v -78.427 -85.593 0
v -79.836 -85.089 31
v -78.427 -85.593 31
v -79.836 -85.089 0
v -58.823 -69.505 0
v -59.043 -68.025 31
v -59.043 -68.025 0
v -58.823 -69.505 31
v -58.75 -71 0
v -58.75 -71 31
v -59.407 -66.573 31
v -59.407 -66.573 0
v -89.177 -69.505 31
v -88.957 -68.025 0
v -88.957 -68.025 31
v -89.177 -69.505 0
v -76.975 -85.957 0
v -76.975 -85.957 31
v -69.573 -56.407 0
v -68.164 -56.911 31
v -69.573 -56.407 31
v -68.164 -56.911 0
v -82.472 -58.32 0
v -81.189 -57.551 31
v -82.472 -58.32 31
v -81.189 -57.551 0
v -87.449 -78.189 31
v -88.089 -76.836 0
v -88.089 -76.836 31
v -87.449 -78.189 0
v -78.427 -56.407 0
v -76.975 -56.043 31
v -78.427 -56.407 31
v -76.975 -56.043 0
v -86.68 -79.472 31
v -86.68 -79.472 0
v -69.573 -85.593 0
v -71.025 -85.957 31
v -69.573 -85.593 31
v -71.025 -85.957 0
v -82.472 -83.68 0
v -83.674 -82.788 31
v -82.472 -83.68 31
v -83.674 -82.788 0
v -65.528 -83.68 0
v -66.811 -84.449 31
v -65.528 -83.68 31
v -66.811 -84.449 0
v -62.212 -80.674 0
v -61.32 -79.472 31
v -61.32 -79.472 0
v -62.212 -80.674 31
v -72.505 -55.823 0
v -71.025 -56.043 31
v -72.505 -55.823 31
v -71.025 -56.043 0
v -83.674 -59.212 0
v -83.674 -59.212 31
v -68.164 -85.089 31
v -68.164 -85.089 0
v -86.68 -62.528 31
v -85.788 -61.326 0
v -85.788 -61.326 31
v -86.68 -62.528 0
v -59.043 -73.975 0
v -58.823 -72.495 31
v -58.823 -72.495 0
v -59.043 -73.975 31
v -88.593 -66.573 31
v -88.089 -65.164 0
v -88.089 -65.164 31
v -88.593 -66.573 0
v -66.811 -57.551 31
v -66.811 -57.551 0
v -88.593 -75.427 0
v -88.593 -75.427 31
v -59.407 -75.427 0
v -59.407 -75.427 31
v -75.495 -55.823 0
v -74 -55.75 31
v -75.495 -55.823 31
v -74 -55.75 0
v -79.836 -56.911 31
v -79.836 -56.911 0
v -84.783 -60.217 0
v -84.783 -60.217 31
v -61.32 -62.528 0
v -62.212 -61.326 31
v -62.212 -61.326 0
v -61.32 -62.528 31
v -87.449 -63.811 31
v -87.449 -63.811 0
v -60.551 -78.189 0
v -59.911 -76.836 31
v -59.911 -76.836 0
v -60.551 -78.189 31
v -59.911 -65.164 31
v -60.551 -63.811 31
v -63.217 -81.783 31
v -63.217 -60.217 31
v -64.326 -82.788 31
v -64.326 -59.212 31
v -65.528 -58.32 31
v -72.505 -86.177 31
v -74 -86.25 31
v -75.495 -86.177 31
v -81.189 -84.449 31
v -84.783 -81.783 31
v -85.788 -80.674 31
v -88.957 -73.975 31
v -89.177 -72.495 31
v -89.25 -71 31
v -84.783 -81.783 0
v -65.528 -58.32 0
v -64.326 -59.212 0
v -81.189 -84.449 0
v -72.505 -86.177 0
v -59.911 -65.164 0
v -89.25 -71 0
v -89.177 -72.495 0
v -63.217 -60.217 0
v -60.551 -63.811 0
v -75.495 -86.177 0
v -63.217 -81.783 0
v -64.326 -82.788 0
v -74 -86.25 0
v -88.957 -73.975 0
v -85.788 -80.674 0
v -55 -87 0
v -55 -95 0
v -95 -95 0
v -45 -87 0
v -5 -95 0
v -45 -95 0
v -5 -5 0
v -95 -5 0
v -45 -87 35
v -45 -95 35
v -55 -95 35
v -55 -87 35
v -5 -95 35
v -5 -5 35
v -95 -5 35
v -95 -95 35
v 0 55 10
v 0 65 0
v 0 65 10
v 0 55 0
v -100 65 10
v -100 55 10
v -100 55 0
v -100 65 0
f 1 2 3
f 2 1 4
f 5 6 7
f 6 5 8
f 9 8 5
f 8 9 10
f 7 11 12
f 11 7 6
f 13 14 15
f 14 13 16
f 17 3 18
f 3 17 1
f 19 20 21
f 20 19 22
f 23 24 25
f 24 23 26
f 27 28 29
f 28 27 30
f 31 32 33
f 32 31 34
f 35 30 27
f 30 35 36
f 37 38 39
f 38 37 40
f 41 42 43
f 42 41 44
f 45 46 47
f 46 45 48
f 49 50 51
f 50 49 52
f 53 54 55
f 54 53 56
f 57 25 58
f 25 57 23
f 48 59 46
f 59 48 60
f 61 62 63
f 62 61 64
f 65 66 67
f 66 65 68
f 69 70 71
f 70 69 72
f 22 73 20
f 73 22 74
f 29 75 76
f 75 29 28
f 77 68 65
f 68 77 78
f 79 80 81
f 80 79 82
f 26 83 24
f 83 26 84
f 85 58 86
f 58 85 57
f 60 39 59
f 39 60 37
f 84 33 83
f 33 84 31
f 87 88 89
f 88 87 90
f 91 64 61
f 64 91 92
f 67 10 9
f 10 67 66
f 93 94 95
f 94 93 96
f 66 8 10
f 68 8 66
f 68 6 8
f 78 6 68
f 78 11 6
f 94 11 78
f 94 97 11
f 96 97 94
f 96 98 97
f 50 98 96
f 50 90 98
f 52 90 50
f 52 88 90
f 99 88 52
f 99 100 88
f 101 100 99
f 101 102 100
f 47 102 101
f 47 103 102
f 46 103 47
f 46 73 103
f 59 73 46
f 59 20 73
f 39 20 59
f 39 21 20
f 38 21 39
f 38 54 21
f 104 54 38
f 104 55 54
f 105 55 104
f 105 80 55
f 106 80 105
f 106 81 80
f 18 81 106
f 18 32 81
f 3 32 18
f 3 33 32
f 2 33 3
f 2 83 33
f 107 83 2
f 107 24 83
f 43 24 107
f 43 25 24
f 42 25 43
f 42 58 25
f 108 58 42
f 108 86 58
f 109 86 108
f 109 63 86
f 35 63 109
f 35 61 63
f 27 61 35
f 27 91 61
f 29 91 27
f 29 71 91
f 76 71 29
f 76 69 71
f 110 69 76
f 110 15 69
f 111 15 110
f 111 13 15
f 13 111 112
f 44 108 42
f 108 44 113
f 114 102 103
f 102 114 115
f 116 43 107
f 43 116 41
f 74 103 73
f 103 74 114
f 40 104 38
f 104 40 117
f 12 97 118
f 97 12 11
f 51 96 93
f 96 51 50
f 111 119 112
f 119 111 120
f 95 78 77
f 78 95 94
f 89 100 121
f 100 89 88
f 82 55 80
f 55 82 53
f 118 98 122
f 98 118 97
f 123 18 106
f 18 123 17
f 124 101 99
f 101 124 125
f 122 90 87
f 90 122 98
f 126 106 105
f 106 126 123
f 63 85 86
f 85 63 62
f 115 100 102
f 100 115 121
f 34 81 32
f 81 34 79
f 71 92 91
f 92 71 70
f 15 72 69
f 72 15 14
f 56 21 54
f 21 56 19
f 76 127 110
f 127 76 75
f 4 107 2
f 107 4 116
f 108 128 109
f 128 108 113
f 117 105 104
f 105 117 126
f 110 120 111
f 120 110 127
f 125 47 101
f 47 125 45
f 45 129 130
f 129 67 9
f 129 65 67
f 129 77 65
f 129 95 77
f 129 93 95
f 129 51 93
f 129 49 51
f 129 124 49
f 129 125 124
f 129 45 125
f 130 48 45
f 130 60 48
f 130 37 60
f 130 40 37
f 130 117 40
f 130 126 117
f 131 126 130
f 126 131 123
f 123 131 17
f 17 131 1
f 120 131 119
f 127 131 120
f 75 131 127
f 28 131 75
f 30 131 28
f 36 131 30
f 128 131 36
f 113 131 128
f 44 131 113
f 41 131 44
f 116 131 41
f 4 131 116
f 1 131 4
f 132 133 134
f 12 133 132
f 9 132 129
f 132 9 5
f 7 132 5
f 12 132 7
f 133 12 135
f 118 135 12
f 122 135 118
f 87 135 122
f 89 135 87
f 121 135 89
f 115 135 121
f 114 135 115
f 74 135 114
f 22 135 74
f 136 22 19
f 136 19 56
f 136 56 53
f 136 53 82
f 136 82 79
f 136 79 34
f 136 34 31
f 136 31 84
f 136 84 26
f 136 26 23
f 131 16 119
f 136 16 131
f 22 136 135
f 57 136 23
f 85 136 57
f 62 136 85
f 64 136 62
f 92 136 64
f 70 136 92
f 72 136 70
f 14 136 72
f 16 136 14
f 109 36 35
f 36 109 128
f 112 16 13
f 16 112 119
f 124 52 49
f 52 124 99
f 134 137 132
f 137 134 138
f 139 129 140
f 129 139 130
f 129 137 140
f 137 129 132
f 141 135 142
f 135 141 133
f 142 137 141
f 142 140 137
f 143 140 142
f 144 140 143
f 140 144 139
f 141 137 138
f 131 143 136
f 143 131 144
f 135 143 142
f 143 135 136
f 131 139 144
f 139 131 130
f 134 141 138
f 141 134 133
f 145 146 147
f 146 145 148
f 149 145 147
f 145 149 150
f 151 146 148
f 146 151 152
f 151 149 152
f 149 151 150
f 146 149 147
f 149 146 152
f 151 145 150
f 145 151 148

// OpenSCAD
// Dimensions for Part 1: Base Block
base_x = 90;
base_y = 90;
base_z = 35;

// Dimensions for Part 1: Tube Seats
seat_dia = 30.5;
seat_depth = 30;
seat_floor = 5; // base_z - seat_depth
seat_x_pos = 21;
seat_y_pos = 24;

// Dimensions for Part 1: Posts
post_x = 10;
post_y = 16;
post_z = 160;
post_hole_x = 10.4;
post_hole_y = 10.4;
post_hole_z = 150;

// Dimensions for Part 2: Handle
handle_x = 100;
handle_y = 10;
handle_z = 10;
handle_y_start = 55;
handle_y_end = 65;

// Global settings
$fn = 64;

// --- Part 1: Base Block ---
translate([-base_x/2 - 50, -base_y/2 - 50, 0]) {
    difference() {
        // Main base block
        cube([base_x, base_y, base_z], center = false);
        
        // Four blind seats for 50 mL tubes
        for (sx = [-seat_x_pos, seat_x_pos]) {
            for (sy = [-seat_y_pos, seat_y_pos]) {
                translate([sx, sy, 0]) {
                    cylinder(r = seat_dia / 2, h = seat_depth + 1, center = false);
                }
            }
        }
        
        // Two posts
        for (px = [-base_x/2 + post_x/2, base_x/2 - post_x/2]) {
            translate([px, -post_y/2, 0]) {
                cube([post_x, post_y, post_z], center = false);
                
                // Square hole through post along X axis
                translate([post_x/2, 0, post_hole_z - post_hole_y/2]) {
                    cube([post_x + 1, post_hole_y, post_hole_y + 1], center = true);
                }
            }
        }
    }
}

// --- Part 2: Handle ---
translate([-handle_x/2 - 50, handle_y_start, 0]) {
    cube([handle_x, handle_y, handle_z], center = false);
}
